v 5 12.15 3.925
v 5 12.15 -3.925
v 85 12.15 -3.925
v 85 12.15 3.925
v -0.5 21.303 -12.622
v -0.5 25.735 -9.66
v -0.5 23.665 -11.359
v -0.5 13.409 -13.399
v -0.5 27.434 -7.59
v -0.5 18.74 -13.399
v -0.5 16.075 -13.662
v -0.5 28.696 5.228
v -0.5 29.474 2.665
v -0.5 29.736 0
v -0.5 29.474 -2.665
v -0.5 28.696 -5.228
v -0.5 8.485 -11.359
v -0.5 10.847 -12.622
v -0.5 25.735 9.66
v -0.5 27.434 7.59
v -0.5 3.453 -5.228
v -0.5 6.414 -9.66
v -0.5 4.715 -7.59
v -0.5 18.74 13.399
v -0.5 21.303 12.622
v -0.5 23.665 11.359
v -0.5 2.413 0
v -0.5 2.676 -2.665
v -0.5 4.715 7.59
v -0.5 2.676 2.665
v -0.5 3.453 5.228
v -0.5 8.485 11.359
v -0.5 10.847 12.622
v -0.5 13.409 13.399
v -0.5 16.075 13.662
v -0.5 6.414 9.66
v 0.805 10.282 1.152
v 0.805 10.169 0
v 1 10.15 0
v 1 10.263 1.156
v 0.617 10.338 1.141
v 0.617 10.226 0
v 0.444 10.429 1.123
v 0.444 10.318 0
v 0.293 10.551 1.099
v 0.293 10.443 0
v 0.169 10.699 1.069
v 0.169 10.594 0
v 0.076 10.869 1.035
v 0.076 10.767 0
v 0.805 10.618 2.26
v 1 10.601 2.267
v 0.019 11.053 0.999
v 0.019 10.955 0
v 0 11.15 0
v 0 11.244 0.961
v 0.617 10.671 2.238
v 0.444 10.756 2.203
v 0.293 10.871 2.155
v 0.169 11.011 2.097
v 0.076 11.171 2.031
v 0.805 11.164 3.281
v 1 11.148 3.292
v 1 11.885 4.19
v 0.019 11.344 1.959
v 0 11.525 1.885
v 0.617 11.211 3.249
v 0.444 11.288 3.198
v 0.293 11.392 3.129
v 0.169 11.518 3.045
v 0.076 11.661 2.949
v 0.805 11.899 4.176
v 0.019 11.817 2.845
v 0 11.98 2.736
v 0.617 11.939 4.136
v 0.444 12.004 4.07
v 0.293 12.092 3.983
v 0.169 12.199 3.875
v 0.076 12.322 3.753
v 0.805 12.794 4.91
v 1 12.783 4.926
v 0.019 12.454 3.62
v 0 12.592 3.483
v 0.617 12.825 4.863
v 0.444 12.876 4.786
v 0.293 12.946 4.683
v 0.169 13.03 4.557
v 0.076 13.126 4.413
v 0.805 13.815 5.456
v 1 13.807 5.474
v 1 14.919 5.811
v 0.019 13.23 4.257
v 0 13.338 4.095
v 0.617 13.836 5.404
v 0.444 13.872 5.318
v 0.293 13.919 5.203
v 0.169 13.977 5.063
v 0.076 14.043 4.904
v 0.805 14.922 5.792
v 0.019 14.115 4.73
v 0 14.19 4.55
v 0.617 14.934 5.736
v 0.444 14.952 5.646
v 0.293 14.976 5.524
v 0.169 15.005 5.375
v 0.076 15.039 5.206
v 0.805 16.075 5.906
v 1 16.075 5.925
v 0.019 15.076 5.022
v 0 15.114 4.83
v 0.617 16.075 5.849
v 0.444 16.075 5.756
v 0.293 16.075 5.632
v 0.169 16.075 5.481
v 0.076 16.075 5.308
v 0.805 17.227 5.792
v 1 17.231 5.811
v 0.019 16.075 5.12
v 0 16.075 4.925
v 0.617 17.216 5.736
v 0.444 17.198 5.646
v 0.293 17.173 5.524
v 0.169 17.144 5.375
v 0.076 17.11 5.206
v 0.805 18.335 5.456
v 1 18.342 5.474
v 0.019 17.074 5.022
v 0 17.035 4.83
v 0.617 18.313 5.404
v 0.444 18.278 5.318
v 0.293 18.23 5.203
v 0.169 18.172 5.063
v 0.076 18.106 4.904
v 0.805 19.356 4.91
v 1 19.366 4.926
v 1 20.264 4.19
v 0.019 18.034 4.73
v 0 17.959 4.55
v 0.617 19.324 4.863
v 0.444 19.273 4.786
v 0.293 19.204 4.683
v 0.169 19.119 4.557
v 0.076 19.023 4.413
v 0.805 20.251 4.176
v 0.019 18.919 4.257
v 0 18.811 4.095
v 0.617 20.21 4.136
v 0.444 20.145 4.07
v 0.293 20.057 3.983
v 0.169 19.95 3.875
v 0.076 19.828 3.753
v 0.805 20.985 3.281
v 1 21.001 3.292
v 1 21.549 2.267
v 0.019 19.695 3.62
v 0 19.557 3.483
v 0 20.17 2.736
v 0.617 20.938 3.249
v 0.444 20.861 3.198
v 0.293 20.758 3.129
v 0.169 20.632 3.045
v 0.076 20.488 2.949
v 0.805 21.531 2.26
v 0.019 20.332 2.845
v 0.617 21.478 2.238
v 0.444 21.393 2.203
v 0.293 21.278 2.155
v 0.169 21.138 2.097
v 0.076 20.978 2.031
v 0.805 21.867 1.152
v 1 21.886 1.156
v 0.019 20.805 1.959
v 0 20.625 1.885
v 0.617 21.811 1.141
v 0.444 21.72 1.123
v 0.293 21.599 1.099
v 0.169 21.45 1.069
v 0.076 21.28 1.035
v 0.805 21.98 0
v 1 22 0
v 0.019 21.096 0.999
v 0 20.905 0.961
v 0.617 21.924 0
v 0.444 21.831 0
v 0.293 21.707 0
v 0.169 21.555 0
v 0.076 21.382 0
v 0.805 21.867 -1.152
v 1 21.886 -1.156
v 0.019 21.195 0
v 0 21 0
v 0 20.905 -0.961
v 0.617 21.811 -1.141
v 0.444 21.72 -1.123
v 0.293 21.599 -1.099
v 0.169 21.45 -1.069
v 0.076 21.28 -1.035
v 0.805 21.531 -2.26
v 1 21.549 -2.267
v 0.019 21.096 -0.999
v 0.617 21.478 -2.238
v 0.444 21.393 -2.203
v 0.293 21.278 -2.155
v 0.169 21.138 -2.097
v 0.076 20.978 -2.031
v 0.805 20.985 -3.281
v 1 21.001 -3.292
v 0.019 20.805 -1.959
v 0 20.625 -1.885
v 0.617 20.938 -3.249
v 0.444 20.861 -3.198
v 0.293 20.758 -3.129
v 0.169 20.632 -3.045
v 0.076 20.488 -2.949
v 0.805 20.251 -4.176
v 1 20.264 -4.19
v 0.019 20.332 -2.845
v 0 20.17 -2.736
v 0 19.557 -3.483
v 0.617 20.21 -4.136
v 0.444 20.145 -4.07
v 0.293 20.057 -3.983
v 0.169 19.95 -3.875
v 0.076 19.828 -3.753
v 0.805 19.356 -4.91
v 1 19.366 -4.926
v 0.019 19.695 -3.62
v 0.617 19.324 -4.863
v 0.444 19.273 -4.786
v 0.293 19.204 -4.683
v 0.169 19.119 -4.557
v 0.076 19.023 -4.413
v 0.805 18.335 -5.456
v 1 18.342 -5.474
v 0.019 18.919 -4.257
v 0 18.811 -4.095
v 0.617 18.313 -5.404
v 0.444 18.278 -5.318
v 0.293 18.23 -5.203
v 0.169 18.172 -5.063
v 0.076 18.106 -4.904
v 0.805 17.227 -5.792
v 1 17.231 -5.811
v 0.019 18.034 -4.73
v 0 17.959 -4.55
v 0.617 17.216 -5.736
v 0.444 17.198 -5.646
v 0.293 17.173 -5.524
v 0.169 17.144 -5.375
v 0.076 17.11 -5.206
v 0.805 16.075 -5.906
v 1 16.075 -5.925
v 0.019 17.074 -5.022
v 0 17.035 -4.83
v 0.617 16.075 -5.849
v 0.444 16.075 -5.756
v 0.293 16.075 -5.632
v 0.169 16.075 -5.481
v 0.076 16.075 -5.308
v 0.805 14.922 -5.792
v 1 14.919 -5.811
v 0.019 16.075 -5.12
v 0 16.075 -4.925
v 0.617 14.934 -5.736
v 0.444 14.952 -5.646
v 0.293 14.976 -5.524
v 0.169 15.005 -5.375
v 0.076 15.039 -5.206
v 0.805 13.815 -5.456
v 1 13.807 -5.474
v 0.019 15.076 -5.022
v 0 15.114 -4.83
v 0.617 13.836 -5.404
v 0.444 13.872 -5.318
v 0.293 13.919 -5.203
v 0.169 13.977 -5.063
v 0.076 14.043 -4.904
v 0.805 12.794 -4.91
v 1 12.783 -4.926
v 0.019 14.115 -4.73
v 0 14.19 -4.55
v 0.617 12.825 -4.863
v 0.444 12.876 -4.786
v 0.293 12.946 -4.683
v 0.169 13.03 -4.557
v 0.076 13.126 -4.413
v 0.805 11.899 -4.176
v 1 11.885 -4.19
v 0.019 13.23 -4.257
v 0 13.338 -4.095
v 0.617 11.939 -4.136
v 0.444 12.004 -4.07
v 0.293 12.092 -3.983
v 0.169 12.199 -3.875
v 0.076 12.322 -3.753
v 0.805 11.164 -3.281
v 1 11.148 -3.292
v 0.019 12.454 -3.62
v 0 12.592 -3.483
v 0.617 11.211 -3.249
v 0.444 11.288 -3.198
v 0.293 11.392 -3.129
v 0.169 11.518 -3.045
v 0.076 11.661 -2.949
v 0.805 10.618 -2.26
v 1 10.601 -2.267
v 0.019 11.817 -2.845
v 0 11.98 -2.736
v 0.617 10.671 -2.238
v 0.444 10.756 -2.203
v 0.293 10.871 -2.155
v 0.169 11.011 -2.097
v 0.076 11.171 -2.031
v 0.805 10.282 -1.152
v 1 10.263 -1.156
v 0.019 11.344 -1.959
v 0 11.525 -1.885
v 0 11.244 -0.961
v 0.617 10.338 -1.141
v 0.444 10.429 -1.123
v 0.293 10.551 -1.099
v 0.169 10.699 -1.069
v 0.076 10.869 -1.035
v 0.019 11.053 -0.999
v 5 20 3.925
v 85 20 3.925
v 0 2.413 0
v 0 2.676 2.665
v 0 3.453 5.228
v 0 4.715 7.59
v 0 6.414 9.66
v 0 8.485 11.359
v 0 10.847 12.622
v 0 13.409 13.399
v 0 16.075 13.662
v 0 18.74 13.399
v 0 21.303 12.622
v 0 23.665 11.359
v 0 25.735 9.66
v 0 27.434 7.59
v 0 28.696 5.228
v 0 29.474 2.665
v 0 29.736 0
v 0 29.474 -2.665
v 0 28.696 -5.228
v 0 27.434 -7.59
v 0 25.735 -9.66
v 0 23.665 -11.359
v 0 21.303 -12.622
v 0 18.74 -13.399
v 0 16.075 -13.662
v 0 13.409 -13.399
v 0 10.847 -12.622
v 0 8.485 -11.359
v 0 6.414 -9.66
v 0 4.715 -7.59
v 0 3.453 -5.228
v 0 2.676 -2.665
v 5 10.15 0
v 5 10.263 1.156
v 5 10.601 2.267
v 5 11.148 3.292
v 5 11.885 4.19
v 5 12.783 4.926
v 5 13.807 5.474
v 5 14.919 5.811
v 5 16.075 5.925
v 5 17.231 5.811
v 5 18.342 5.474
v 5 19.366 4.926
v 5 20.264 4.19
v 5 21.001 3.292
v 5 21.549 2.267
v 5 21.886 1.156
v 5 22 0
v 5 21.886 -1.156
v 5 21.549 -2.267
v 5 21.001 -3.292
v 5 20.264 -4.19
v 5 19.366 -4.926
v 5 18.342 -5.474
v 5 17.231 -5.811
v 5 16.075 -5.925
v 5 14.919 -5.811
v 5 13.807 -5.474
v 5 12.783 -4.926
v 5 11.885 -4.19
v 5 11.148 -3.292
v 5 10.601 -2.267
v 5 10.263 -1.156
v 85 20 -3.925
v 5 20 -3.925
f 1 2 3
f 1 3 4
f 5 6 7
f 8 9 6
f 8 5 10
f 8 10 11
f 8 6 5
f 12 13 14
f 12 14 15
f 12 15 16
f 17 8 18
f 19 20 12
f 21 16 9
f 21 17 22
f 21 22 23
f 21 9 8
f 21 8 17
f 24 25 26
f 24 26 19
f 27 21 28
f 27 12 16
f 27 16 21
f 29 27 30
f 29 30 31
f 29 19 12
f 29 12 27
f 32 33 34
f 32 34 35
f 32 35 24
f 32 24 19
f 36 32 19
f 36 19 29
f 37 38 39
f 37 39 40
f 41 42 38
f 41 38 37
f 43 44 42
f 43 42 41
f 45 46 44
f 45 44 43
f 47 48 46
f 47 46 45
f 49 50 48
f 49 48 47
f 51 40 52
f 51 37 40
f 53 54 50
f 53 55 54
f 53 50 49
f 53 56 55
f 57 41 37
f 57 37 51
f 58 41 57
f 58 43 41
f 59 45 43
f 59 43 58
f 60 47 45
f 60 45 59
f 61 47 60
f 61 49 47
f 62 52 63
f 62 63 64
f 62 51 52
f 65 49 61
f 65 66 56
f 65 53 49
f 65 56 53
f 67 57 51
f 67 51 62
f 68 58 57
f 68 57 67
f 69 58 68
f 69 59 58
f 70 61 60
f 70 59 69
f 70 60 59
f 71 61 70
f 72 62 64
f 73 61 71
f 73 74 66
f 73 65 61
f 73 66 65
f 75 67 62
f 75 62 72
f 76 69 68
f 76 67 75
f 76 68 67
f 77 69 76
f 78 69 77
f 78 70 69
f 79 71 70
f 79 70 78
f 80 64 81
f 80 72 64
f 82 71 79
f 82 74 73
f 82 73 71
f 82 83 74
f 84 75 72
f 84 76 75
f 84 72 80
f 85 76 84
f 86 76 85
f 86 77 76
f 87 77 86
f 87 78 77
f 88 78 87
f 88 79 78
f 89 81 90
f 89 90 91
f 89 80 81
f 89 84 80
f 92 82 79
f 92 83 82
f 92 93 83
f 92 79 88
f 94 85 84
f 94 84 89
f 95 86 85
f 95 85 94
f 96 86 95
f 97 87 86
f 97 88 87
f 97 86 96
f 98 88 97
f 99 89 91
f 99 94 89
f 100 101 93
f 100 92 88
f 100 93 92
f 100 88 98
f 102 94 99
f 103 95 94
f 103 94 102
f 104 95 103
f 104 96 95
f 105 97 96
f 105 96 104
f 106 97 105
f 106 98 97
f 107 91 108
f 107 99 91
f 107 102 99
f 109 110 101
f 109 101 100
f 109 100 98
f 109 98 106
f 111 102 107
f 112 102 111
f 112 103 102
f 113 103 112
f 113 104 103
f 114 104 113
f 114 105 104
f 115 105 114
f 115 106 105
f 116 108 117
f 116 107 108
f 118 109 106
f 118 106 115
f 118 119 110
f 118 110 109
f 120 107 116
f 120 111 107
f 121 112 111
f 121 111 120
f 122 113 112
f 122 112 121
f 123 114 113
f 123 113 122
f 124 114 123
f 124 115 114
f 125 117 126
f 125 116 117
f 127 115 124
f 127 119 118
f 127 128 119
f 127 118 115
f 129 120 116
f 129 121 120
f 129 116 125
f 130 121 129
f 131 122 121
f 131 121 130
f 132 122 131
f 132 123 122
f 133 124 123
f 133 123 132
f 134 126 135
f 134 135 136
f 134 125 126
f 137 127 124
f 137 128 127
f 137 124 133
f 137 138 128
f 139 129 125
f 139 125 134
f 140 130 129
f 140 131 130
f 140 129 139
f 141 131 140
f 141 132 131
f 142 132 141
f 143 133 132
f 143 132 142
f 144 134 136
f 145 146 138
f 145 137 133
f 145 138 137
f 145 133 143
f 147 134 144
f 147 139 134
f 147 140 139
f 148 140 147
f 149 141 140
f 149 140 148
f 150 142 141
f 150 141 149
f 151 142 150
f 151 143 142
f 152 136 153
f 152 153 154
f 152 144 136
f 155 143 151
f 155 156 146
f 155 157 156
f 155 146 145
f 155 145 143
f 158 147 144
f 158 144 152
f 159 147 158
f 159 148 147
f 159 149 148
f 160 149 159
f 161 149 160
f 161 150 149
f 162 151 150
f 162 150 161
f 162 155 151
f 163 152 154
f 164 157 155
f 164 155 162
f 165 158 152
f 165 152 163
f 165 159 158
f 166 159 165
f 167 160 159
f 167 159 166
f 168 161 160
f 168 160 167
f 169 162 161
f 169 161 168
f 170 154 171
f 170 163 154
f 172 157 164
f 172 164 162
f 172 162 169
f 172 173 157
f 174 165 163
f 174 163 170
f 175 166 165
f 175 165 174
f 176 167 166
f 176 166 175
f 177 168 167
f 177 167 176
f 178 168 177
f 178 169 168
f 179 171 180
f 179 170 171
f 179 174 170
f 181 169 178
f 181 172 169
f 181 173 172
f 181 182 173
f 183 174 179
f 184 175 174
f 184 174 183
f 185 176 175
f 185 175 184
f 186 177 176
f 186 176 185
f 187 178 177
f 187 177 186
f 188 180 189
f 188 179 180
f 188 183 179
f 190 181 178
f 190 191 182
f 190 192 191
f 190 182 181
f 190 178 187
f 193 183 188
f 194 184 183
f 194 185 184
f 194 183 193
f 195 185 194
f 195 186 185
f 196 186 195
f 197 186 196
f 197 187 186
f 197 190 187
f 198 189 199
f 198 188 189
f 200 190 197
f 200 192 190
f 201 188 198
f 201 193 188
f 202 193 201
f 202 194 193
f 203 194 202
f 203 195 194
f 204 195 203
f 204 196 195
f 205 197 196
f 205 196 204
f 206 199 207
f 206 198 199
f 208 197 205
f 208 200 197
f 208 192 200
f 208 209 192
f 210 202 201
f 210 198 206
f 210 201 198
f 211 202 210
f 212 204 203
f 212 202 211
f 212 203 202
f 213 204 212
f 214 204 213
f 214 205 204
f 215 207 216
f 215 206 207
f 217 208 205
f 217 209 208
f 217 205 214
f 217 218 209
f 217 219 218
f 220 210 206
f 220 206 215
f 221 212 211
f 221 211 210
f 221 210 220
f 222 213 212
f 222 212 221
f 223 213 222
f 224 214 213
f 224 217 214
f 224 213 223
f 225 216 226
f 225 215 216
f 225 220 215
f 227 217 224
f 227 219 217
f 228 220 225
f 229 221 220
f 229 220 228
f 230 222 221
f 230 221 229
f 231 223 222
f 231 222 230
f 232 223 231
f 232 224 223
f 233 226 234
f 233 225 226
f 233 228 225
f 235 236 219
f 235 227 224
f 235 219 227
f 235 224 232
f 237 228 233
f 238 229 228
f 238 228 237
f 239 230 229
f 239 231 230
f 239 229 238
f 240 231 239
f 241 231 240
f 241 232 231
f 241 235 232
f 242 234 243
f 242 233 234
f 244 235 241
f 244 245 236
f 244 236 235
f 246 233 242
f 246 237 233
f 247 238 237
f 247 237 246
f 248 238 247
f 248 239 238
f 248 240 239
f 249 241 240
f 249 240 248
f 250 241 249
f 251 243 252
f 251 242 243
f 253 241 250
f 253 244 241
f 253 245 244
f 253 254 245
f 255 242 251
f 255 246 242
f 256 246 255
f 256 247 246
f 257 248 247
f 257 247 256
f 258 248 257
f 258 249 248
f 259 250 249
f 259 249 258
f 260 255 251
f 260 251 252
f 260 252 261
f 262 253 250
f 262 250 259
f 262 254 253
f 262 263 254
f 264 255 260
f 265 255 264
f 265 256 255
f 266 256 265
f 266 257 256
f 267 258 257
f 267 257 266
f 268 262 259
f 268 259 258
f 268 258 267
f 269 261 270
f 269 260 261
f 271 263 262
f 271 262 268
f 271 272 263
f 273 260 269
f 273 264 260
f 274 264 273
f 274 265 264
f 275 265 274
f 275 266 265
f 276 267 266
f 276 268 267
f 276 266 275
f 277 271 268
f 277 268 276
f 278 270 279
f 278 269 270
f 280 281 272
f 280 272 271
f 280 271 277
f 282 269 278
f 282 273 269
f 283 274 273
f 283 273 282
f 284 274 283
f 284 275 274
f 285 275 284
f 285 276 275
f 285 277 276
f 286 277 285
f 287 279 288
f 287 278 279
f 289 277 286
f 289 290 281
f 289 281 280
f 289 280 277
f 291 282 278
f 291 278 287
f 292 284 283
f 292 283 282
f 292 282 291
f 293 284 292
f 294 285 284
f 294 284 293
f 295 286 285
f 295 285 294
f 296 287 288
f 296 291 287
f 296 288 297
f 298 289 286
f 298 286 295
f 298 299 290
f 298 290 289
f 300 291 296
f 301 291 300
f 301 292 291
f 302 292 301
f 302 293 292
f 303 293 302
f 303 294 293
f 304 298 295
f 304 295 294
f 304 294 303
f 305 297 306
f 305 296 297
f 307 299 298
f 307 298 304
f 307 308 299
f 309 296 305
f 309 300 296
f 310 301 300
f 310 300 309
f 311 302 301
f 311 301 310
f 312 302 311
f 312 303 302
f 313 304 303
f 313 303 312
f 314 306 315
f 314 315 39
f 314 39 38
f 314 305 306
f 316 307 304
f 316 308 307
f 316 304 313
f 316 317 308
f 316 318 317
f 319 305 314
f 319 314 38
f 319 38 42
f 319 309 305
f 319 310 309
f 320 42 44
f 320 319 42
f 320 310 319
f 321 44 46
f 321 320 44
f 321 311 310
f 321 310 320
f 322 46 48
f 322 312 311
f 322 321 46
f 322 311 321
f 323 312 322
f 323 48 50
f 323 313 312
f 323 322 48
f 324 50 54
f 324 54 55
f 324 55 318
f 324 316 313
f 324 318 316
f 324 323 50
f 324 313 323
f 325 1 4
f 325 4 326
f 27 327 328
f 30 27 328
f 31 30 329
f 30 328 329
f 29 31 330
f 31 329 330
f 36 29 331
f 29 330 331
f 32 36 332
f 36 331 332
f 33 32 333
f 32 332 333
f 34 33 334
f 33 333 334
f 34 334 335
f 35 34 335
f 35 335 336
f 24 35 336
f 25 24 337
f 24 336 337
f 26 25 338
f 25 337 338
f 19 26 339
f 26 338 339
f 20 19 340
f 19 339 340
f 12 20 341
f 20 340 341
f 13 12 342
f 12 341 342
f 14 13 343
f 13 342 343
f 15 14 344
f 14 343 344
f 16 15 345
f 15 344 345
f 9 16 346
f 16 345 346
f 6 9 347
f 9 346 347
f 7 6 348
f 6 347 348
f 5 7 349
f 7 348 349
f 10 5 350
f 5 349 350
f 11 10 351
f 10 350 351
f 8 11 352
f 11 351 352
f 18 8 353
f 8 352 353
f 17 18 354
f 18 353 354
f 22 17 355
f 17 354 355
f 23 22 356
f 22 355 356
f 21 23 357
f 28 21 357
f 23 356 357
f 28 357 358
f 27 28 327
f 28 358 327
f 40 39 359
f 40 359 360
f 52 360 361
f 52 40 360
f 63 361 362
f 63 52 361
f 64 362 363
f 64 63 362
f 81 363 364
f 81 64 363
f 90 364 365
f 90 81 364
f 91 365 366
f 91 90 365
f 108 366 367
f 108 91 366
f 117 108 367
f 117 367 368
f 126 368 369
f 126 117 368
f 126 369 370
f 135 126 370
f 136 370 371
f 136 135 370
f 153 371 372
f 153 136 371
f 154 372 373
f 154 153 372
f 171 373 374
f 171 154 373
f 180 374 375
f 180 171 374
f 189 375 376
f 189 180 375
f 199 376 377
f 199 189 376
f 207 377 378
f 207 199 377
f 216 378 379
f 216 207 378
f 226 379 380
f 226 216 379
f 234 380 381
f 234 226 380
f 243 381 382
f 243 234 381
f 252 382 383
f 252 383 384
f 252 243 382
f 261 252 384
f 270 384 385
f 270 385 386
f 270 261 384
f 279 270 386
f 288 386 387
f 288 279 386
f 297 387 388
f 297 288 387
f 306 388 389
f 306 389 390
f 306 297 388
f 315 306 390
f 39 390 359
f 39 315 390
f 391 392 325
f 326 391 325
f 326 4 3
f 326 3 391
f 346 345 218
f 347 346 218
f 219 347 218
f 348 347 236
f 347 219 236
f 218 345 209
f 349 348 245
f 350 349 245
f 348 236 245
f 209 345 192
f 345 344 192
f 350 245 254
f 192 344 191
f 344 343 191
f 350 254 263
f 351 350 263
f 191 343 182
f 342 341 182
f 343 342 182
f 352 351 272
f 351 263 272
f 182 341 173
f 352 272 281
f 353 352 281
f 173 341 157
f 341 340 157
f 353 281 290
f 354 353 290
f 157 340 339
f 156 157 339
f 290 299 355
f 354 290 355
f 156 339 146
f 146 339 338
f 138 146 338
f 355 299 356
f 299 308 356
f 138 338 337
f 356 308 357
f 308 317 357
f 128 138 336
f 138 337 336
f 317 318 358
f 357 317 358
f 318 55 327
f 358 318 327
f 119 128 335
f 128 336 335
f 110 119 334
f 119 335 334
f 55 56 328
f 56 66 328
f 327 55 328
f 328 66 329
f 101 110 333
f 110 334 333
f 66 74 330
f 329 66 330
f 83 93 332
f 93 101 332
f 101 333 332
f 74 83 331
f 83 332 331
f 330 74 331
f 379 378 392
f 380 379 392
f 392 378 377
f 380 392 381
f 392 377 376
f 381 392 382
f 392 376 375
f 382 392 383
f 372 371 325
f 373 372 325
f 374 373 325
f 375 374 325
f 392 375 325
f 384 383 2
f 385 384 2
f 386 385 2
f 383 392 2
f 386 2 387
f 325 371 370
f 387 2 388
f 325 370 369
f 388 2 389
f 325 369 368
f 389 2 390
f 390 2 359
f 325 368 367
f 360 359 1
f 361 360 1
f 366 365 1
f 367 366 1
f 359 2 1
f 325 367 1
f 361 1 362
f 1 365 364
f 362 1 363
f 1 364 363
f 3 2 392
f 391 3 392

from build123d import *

# Parameters (mm, degrees)
F0_W     = 7.85
F0_H     = 7.85
F1_DEPTH = 85
F2_R     = 5.925
F3_DEPTH = 5
F4_R     = 1
F5_R     = 13.6615771023
F5_R_2   = 4.925
F6_DEPTH = 0.5


with BuildPart() as f1:
    # F0 (on Right) → F1 (new body)
    with BuildSketch(Plane.YZ):
        with Locations((16.0746219532, 0)):
            Rectangle(F0_W, F0_H)
    extrude(amount=F1_DEPTH)

    # F2 (on face) → F3 (join)
    with BuildSketch(Plane(origin=(0, 0, 0), x_dir=(0, -1, 0), z_dir=(-1, 0, 0))):
        with Locations((-16.0746219532, 0)):
            Circle(F2_R)
        Polygon((-19.9996219532, 3.925), (-16.0746219532, 3.925), (-12.1496219532, 3.925), (-12.1496219532, 0), (-12.1496219532, -3.925), (-16.0746219532, -3.925), (-19.9996219532, -3.925), (-19.9996219532, 0), align=None, mode=Mode.SUBTRACT)
    extrude(amount=-F3_DEPTH)

    # F4
    f4_edges = [f1.edges().sort_by_distance(p)[0] for p in [
        (0, 21.999622, 0),
    ]]
    fillet(f4_edges, radius=F4_R)

    # F5 (on face) → F6 (join)
    with BuildSketch(Plane(origin=(0, 0, 0), x_dir=(0, -1, 0), z_dir=(-1, 0, 0))):
        with Locations((-16.0746219532, 0)):
            Circle(F5_R)
        with Locations((-16.0746219532, 0)):
            Circle(F5_R_2, mode=Mode.SUBTRACT)
        with Locations((-16.0746219532, 0)):
            Circle(F5_R_2)
    extrude(amount=F6_DEPTH)


solid = f1.part
